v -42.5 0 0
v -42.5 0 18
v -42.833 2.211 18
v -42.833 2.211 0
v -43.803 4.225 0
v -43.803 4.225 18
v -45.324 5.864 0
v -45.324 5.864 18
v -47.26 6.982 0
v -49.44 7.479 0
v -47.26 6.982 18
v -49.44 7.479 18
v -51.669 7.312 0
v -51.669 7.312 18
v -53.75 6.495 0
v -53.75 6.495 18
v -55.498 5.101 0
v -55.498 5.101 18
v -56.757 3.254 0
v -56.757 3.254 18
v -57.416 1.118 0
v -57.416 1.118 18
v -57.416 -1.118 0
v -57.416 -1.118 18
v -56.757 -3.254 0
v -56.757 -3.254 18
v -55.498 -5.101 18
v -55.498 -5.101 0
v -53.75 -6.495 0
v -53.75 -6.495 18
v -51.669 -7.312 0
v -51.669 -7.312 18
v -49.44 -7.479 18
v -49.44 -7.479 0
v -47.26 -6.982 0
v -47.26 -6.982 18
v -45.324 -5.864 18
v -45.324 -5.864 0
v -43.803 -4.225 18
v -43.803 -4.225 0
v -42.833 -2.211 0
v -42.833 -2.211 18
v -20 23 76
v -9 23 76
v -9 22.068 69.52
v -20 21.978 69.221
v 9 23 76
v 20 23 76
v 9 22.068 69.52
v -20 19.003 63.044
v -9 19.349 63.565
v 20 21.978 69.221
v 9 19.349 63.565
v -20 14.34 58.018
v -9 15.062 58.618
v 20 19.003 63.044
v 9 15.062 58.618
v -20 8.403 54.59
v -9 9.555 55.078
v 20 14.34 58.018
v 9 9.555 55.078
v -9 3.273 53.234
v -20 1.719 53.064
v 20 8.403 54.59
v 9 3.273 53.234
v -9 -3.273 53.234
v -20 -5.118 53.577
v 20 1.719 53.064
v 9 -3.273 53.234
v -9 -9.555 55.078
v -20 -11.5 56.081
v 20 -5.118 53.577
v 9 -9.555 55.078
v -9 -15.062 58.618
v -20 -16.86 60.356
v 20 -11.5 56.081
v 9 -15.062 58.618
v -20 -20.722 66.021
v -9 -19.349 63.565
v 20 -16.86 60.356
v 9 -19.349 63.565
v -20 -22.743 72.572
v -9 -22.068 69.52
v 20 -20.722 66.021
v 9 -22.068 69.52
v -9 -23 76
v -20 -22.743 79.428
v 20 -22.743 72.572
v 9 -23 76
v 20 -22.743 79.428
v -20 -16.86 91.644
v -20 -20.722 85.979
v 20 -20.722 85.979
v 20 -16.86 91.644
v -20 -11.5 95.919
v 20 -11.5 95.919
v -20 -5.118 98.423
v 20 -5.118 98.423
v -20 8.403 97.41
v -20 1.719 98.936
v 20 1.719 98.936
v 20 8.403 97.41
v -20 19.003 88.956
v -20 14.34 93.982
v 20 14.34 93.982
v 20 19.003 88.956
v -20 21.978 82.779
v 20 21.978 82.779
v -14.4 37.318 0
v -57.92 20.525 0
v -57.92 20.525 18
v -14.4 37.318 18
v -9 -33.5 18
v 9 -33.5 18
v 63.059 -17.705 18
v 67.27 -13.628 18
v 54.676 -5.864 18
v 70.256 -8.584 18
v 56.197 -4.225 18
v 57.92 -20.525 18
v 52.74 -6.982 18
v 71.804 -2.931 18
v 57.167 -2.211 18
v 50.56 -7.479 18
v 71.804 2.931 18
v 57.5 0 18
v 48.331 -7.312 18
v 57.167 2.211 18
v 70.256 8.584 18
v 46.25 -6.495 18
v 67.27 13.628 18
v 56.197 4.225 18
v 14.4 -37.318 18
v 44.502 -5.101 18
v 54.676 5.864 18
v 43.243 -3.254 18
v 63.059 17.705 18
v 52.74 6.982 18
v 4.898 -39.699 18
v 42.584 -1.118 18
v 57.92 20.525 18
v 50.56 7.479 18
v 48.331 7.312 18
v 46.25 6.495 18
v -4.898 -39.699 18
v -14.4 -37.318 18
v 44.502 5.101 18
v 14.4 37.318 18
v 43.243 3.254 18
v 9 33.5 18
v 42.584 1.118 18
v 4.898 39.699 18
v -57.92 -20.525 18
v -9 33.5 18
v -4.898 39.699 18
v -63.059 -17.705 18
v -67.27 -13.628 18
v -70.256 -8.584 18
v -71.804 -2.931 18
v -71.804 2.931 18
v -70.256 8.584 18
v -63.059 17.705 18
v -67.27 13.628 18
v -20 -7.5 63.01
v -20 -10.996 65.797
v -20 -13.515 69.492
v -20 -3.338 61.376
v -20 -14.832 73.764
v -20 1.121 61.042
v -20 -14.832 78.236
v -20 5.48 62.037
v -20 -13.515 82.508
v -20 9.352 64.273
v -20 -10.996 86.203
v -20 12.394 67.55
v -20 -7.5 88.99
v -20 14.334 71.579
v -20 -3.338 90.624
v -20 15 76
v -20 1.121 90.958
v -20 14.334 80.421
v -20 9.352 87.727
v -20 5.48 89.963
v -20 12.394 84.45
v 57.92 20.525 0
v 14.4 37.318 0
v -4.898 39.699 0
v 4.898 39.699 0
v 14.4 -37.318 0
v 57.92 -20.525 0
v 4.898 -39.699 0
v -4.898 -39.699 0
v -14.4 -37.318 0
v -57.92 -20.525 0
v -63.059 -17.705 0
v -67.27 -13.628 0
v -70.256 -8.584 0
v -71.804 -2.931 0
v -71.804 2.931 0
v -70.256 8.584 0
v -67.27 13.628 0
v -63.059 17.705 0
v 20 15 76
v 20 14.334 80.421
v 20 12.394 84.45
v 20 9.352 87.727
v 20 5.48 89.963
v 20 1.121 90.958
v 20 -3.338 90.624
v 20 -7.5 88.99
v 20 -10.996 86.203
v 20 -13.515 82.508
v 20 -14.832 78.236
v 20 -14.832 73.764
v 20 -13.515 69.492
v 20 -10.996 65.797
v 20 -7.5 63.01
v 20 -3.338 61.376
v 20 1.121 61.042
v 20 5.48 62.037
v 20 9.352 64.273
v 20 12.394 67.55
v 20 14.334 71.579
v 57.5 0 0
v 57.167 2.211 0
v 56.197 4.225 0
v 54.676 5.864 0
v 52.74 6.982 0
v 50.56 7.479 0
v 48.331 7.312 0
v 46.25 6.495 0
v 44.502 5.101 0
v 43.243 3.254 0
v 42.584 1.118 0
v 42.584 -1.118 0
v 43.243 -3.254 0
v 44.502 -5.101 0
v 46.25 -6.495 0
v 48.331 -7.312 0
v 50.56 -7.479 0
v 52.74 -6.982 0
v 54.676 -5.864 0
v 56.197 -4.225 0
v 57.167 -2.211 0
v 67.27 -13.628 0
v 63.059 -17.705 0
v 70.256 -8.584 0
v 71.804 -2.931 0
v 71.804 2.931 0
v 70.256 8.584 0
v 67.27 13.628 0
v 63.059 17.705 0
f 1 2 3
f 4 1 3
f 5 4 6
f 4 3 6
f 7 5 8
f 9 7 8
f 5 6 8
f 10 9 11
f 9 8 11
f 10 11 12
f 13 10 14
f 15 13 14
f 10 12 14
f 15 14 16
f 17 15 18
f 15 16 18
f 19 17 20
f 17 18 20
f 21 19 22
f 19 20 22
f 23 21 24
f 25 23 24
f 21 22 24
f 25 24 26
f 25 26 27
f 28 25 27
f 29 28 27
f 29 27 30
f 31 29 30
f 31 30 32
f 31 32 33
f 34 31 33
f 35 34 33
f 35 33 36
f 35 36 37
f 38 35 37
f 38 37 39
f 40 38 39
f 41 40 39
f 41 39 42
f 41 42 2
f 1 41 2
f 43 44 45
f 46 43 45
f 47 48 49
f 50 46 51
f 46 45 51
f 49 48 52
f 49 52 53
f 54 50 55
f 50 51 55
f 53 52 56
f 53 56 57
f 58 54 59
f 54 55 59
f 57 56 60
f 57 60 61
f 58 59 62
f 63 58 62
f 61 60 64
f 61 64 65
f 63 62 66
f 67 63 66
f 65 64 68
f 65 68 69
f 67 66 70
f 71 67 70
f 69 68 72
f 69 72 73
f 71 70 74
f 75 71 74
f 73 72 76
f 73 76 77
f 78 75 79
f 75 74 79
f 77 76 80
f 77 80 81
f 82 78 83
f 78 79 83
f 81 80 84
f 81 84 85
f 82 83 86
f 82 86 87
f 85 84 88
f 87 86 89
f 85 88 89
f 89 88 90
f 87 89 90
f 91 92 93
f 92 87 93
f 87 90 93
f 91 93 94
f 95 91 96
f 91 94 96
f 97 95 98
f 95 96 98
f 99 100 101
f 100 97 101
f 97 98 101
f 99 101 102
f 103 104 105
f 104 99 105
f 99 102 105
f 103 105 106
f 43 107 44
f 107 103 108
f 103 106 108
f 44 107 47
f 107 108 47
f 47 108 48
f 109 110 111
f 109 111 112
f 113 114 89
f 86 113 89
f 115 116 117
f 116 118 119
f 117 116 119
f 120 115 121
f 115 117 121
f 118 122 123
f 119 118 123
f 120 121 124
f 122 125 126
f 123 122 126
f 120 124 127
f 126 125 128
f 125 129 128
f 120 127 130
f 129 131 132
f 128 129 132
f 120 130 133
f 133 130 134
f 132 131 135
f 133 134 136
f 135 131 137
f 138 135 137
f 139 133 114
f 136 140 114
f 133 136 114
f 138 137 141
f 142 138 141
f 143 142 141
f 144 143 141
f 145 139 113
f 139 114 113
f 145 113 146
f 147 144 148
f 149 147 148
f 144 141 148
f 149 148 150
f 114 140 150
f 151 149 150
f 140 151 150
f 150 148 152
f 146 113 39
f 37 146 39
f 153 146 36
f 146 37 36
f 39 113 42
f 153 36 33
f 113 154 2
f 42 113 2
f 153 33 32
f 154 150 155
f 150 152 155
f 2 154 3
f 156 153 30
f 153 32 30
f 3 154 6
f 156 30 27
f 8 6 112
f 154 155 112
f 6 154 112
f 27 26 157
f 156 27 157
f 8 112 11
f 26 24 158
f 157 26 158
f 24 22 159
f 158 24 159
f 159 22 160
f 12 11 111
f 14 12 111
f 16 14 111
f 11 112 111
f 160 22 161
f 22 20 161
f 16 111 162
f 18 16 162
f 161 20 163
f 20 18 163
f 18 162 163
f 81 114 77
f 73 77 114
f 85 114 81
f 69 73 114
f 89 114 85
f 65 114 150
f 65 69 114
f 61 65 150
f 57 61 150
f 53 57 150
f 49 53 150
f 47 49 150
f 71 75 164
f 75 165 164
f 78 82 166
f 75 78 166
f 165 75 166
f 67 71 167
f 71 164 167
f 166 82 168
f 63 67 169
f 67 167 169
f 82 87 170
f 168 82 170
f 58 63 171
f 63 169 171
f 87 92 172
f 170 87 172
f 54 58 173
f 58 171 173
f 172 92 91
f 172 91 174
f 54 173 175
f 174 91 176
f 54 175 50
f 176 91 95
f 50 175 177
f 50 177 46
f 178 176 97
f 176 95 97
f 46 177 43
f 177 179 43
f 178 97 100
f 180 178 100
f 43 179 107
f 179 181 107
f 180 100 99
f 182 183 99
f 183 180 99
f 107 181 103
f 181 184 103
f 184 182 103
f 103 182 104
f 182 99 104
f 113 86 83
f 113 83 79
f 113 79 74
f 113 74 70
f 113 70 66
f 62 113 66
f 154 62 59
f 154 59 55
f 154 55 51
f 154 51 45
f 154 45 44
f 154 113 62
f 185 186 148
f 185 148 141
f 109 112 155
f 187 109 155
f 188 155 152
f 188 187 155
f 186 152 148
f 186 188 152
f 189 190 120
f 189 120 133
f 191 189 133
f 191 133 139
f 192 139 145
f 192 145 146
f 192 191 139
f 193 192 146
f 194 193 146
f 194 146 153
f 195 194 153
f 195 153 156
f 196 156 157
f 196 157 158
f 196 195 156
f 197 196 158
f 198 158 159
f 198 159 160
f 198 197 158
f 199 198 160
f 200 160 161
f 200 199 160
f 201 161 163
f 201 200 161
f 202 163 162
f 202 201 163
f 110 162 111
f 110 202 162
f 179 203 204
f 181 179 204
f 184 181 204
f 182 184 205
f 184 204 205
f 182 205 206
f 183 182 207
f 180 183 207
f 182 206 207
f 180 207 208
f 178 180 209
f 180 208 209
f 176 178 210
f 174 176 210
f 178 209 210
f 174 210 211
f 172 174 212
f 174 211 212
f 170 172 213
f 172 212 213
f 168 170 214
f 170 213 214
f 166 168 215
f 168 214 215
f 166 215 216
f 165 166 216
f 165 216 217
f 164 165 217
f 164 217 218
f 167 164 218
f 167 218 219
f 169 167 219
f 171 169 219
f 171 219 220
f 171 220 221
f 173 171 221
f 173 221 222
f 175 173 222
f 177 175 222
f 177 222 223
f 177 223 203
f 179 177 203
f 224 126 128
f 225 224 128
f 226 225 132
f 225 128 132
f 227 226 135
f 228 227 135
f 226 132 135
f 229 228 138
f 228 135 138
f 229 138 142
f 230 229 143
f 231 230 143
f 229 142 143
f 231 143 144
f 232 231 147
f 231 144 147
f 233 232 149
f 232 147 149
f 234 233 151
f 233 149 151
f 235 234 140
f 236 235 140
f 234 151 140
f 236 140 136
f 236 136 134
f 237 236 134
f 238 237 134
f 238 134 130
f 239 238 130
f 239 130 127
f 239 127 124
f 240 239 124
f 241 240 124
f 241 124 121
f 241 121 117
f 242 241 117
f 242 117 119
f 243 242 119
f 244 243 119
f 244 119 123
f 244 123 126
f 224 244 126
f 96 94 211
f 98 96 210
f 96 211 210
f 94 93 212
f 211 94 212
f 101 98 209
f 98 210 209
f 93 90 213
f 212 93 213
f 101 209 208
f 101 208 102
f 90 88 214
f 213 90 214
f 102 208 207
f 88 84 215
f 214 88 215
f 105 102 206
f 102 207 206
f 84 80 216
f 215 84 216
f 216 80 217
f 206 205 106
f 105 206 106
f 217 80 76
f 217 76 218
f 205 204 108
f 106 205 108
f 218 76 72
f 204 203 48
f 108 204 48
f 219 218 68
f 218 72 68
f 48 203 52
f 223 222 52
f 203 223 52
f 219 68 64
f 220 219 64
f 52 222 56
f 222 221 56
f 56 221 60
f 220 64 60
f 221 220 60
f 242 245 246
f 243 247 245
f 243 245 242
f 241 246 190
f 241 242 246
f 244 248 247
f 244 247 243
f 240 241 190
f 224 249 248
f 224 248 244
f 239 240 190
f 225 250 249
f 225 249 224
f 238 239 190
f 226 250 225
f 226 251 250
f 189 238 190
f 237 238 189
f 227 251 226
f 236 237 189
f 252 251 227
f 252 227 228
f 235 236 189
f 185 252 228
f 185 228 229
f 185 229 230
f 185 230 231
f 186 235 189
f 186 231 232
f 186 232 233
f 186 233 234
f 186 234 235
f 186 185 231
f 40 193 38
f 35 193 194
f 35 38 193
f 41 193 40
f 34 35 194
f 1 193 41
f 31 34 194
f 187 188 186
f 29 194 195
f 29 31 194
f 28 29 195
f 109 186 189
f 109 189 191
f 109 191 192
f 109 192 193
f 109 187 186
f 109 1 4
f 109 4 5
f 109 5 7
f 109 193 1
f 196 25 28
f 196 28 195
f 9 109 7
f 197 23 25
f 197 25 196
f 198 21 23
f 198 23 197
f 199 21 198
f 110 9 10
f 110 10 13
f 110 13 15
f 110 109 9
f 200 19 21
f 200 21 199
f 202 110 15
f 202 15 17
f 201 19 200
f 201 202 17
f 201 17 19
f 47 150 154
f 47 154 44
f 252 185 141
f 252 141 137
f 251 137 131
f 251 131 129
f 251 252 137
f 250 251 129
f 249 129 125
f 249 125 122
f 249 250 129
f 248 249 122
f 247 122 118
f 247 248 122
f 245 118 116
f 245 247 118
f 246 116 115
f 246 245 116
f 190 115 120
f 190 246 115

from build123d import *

# Parameters (mm, degrees)
BOSS_EXTRUDE1_DEPTH = 18
SKETCH3_W           = 18
SKETCH3_H           = 67
BOSS_EXTRUDE2_DEPTH = 58
SKETCH4_R           = 23
BOSS_EXTRUDE3_DEPTH = 29
BOSS_EXTRUDE4_START = -40
SKETCH5_R           = 23
BOSS_EXTRUDE4_DEPTH = 40
SKETCH6_R           = 15
CUT_EXTRUDE1_DEPTH  = 141.943250991
CUT_EXTRUDE2_DEPTH  = 135.02238619
SKETCH8_R           = 7.5
CUT_EXTRUDE3_DEPTH  = 116.52056094


with BuildPart() as part:
    # Sketch2 → Boss-Extrude1 (new body)
    with BuildSketch(Plane.XY):
        with BuildLine():
            Line((-57.919997401, 20.524958004), (-14.399995275, 37.31809395))
            ThreePointArc((-14.399995275, 37.31809395), (0, 40), (14.399995275, 37.31809395))
            Line((14.399995275, 37.31809395), (57.919997401, 20.524958004))
            ThreePointArc((57.919997401, 20.524958004), (72, 9.117e-06), (57.920002599, -20.524943336))
            Line((57.920002599, -20.524943336), (14.399995275, -37.31809395))
            ThreePointArc((14.399995275, -37.31809395), (-5.065e-06, -40), (-14.400004725, -37.318090304))
            Line((-14.400004725, -37.318090304), (-57.920002599, -20.524943336))
            ThreePointArc((-57.920002599, -20.524943336), (-72, 9.117e-06), (-57.919997401, 20.524958004))
        make_face()
    extrude(amount=BOSS_EXTRUDE1_DEPTH)

    # Sketch3 → Boss-Extrude2 (add)
    with BuildSketch(Plane.XY.offset(18)):
        Rectangle(SKETCH3_W, SKETCH3_H)
    extrude(amount=BOSS_EXTRUDE2_DEPTH)

    # Sketch4 → Boss-Extrude3 (add)
    with BuildSketch(Plane(origin=(9, 0, 0), x_dir=(0, 0, -1), z_dir=(1, 0, 0))):
        with Locations(Location((-76, 0, 0), (0, 0, 90))):
            Circle(SKETCH4_R)
    extrude(amount=-BOSS_EXTRUDE3_DEPTH)

    # Sketch5 → Boss-Extrude4 (add)
    with BuildSketch(Plane.ZY.offset(20).offset(BOSS_EXTRUDE4_START)):
        with Locations(Location((76, 0, 0), (0, 0, 90))):
            Circle(SKETCH5_R)
    extrude(amount=BOSS_EXTRUDE4_DEPTH)

    # Sketch6 → Cut-Extrude1 (cut, through all)
    with BuildSketch(Plane(origin=(20, 0, 0), x_dir=(0, 0, -1), z_dir=(1, 0, 0))):
        with Locations(Location((-76, 0, 0), (0, 0, 90))):
            Circle(SKETCH6_R)
    extrude(amount=-CUT_EXTRUDE1_DEPTH, mode=Mode.SUBTRACT)

    # Sketch7 → Cut-Extrude2 (cut, through all)
    with BuildSketch(Plane(origin=(9, 0, 0), x_dir=(0, 0, -1), z_dir=(1, 0, 0))):
        Polygon((-18, -33.5), (-76, -23), (-76, -33.5), align=None)
        Polygon((-18, 33.5), (-76, 23), (-76, 33.5), align=None)
    extrude(amount=-CUT_EXTRUDE2_DEPTH, mode=Mode.SUBTRACT)

    # Sketch8 → Cut-Extrude3 (cut, through all)
    with BuildSketch(Plane.XY.offset(18)):
        with Locations((50, 6.331e-06)):
            Circle(SKETCH8_R)
        with Locations((-50, 6.331e-06)):
            Circle(SKETCH8_R)
    extrude(amount=-CUT_EXTRUDE3_DEPTH, mode=Mode.SUBTRACT)


solid = part.part
